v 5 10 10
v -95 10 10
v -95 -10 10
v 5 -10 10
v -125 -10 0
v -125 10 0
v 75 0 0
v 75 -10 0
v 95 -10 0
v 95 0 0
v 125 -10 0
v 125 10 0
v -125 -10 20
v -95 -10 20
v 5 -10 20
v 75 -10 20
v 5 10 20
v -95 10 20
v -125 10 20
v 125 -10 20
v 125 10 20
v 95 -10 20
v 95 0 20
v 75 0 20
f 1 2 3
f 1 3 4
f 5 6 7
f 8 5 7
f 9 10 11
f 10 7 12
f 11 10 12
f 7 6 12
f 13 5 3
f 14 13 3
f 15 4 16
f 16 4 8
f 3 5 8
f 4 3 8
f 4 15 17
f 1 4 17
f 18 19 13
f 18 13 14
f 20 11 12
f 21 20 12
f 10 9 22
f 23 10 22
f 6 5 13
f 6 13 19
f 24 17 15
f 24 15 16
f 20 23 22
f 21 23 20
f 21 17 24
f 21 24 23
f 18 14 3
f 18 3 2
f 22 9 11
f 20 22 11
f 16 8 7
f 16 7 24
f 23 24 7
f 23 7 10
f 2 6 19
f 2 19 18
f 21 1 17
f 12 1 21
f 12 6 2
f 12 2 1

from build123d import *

# Parameters (mm, degrees)
F0_W     = 250
F0_H     = 20
F1_DEPTH = 20
F2_W     = 20
F2_H     = 20
F3_DEPTH = 10
F4_W     = 100
F4_H     = 20
F5_DEPTH = 10


with BuildPart() as f1:
    # F0 (on Top) → F1 (new body)
    with BuildSketch(Plane.XY):
        Rectangle(F0_W, F0_H)
    extrude(amount=F1_DEPTH)

    # F2 (on face) → F3 (cut)
    with BuildSketch(Plane.XZ.offset(10)):
        with Locations((85, 10)):
            Rectangle(F2_W, F2_H)
    extrude(amount=-F3_DEPTH, mode=Mode.SUBTRACT)

    # F4 (on face) → F5 (cut)
    with BuildSketch(Plane.XY.offset(20)):
        with Locations((-45, 0)):
            Rectangle(F4_W, F4_H)
    extrude(amount=-F5_DEPTH, mode=Mode.SUBTRACT)


solid = f1.part
